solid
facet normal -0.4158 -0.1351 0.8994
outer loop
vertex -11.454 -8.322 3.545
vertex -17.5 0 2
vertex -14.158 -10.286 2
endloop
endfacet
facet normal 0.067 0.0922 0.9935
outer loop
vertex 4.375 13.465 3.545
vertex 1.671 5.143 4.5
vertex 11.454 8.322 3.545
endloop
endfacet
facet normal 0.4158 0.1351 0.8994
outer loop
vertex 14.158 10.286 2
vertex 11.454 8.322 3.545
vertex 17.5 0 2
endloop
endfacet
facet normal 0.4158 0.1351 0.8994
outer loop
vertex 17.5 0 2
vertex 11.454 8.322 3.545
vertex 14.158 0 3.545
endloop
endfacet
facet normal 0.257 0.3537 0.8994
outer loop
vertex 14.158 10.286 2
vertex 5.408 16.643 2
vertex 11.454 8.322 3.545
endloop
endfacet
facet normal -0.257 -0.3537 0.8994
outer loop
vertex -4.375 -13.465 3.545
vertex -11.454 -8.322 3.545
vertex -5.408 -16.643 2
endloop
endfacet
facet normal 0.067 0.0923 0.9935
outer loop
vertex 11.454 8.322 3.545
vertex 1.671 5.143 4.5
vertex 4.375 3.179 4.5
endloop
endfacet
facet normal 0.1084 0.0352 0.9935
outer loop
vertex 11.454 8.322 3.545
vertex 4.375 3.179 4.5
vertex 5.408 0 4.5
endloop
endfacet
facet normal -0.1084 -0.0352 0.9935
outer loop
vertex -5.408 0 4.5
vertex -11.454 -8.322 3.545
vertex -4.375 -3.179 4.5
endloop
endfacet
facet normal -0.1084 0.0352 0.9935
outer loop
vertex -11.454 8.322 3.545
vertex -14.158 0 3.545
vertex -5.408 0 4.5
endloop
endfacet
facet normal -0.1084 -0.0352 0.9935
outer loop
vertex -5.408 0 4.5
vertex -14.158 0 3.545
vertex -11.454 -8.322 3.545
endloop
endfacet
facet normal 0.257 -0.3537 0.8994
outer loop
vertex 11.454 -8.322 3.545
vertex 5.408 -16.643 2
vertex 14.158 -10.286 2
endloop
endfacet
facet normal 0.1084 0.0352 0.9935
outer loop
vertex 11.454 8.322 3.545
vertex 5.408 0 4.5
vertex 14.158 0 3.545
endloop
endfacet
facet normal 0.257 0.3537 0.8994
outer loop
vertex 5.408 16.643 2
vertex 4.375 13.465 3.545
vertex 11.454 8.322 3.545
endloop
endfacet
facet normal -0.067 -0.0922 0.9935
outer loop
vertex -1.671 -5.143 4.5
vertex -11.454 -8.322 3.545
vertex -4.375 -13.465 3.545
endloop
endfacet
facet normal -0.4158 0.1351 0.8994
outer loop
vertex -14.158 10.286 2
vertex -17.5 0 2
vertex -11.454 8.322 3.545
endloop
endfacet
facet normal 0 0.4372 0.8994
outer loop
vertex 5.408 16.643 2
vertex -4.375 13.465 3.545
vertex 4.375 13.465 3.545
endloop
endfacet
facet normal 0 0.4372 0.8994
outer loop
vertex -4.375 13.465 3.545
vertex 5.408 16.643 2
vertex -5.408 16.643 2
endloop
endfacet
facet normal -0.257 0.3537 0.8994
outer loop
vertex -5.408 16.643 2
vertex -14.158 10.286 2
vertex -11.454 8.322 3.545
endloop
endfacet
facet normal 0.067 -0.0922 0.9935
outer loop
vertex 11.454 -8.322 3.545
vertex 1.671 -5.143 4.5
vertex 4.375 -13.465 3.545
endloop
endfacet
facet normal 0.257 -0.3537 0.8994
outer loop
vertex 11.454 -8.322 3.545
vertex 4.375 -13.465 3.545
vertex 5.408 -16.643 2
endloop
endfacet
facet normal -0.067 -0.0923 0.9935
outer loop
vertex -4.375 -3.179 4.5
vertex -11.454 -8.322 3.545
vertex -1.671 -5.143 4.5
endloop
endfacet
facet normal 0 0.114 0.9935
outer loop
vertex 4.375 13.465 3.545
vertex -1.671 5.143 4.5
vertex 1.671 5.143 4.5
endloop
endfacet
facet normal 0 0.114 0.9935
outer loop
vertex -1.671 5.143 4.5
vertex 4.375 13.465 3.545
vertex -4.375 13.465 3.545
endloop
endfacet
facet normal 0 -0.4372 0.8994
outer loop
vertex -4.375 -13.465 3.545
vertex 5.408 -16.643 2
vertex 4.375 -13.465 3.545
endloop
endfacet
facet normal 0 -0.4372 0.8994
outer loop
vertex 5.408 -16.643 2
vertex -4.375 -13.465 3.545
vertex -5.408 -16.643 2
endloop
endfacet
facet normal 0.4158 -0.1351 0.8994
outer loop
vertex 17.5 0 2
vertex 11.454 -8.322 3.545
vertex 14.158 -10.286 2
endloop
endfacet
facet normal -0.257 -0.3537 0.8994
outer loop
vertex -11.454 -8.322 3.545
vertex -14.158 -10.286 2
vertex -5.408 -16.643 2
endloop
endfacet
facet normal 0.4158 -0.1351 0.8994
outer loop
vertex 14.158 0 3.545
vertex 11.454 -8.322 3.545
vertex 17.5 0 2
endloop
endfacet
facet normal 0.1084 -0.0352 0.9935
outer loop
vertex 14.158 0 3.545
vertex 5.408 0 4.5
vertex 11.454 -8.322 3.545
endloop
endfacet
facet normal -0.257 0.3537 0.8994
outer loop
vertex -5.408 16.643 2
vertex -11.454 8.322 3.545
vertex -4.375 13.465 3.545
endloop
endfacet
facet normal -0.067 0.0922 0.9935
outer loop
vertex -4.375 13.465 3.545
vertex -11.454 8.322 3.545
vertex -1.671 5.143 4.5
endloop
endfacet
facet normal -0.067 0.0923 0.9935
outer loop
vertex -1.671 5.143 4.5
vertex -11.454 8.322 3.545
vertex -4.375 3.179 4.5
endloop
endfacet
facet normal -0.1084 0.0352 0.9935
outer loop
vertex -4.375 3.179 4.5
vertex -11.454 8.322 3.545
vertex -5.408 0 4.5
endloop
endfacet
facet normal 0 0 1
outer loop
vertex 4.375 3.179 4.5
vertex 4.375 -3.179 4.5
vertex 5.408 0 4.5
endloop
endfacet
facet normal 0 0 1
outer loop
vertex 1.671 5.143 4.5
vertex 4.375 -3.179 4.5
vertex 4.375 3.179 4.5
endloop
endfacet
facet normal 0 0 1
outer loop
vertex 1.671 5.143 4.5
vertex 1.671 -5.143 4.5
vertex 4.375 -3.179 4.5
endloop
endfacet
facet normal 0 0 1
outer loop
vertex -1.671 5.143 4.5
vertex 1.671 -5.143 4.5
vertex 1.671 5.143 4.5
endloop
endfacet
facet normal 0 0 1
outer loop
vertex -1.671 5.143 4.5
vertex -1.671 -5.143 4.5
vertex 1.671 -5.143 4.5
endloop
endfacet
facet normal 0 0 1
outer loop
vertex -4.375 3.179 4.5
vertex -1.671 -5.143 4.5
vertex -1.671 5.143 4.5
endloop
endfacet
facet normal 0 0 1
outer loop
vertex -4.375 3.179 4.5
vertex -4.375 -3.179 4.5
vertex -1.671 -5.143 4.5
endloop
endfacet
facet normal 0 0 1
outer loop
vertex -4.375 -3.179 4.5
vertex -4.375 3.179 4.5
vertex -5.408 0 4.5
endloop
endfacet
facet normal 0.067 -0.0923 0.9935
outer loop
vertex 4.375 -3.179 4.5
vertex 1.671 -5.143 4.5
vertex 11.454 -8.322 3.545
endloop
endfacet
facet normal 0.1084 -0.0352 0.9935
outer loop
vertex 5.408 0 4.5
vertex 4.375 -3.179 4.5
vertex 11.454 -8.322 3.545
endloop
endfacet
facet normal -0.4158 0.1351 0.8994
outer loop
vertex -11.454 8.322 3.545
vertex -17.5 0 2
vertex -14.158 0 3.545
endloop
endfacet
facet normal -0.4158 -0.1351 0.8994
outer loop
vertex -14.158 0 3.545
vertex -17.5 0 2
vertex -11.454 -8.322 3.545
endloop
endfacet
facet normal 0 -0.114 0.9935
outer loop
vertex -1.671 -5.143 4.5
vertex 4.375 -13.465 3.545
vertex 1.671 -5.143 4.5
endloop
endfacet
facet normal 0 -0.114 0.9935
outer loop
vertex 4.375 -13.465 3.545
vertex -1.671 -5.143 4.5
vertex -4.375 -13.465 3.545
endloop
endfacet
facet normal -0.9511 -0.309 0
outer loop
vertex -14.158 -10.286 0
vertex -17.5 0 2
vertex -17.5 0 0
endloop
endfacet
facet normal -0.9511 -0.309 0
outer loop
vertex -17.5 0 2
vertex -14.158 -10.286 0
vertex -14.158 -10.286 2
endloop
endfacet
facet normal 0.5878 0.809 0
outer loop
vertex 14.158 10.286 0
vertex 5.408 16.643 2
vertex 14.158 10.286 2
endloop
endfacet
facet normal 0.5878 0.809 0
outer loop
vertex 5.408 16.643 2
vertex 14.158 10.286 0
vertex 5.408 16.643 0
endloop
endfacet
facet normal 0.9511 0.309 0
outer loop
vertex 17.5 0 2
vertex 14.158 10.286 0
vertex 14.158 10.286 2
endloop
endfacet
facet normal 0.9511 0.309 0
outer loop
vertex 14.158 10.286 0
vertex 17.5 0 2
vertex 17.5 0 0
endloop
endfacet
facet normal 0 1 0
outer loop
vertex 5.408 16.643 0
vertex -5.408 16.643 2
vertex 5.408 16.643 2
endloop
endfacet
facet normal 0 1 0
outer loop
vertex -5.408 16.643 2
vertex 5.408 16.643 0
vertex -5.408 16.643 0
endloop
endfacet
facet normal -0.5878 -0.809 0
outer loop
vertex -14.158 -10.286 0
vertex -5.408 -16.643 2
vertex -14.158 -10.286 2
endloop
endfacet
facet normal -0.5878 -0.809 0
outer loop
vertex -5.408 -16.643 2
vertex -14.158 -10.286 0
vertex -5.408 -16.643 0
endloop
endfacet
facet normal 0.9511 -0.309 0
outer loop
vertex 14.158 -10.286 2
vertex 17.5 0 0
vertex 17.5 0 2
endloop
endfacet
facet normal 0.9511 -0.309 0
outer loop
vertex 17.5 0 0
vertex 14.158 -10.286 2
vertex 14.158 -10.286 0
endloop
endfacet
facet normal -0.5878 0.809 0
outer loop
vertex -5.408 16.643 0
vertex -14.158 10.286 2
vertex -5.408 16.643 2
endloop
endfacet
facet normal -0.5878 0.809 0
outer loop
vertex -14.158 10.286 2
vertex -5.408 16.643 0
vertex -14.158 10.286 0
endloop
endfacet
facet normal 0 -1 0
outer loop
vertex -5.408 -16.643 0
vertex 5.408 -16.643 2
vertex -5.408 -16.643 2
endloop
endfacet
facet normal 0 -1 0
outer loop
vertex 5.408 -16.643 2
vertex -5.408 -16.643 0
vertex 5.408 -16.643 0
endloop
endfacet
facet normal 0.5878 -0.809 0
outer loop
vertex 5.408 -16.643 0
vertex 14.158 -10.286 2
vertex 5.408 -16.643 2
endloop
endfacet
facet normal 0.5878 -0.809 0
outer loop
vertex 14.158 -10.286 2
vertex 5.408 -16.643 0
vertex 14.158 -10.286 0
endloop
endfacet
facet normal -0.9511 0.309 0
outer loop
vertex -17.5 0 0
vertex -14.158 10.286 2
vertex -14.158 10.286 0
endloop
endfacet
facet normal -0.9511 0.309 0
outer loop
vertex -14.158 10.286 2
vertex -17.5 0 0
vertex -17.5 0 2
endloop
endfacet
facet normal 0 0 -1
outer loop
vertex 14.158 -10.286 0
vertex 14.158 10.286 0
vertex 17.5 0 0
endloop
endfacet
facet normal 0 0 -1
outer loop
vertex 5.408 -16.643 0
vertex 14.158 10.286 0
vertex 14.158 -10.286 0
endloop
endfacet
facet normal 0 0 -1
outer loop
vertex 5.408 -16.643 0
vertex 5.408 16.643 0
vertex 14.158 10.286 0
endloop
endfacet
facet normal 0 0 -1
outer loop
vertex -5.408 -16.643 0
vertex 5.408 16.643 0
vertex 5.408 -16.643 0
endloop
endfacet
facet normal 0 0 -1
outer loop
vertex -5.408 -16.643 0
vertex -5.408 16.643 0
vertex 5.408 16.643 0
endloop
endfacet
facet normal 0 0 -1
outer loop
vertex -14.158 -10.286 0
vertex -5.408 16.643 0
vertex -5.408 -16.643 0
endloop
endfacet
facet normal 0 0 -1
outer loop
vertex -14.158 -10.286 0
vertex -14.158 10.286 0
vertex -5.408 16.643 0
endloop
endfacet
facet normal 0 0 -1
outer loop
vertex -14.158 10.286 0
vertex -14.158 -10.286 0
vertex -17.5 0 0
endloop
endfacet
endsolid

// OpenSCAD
// file: constants.scad
$fn = 10;

burger_diameter = 100; // ~ 4in
burger_thickness = 20; // ~ 3/4ths inch
//
//
edge_rounding = 3;
//
wall_thickness = 5; // mm
//
insert_thickness = 4;
insert_lip = 3;
insert_diameter = burger_diameter-(3*(wall_thickness+edge_rounding));
//
press_disc_thickness = 5;

mold_height = press_disc_thickness + insert_thickness + (1.35*burger_thickness);
//
part_mating_fudge = -2; // subtract 2mm from objects that fit inside other objects.

press_support_pillars = 7;

module rcylinder(r1=10,r2=10,h=10,b=2) {
  translate([0,0,-h/2]) hull() {
    rotate_extrude() translate([r1-b,b,0]) circle(r = b); 
    rotate_extrude() translate([r2-b, h-b, 0]) circle(r = b);
  }
}
// main file
include <constants.scad>

main();

module main() {
  difference() {
  dent_plug();
  translate([0,0,-2]) color("red") cylinder(h = 2, r=((0.35*burger_diameter)/2));
  }
}

module dent_plug() {
  union() {
  translate([0,0,2.0]) resize([0,0,.25*burger_thickness],auto=[false,false,true]) sphere(((0.35*burger_diameter))/2);
  color("orange") cylinder(h = 2, r=((0.35*burger_diameter)/2));
  }
}
